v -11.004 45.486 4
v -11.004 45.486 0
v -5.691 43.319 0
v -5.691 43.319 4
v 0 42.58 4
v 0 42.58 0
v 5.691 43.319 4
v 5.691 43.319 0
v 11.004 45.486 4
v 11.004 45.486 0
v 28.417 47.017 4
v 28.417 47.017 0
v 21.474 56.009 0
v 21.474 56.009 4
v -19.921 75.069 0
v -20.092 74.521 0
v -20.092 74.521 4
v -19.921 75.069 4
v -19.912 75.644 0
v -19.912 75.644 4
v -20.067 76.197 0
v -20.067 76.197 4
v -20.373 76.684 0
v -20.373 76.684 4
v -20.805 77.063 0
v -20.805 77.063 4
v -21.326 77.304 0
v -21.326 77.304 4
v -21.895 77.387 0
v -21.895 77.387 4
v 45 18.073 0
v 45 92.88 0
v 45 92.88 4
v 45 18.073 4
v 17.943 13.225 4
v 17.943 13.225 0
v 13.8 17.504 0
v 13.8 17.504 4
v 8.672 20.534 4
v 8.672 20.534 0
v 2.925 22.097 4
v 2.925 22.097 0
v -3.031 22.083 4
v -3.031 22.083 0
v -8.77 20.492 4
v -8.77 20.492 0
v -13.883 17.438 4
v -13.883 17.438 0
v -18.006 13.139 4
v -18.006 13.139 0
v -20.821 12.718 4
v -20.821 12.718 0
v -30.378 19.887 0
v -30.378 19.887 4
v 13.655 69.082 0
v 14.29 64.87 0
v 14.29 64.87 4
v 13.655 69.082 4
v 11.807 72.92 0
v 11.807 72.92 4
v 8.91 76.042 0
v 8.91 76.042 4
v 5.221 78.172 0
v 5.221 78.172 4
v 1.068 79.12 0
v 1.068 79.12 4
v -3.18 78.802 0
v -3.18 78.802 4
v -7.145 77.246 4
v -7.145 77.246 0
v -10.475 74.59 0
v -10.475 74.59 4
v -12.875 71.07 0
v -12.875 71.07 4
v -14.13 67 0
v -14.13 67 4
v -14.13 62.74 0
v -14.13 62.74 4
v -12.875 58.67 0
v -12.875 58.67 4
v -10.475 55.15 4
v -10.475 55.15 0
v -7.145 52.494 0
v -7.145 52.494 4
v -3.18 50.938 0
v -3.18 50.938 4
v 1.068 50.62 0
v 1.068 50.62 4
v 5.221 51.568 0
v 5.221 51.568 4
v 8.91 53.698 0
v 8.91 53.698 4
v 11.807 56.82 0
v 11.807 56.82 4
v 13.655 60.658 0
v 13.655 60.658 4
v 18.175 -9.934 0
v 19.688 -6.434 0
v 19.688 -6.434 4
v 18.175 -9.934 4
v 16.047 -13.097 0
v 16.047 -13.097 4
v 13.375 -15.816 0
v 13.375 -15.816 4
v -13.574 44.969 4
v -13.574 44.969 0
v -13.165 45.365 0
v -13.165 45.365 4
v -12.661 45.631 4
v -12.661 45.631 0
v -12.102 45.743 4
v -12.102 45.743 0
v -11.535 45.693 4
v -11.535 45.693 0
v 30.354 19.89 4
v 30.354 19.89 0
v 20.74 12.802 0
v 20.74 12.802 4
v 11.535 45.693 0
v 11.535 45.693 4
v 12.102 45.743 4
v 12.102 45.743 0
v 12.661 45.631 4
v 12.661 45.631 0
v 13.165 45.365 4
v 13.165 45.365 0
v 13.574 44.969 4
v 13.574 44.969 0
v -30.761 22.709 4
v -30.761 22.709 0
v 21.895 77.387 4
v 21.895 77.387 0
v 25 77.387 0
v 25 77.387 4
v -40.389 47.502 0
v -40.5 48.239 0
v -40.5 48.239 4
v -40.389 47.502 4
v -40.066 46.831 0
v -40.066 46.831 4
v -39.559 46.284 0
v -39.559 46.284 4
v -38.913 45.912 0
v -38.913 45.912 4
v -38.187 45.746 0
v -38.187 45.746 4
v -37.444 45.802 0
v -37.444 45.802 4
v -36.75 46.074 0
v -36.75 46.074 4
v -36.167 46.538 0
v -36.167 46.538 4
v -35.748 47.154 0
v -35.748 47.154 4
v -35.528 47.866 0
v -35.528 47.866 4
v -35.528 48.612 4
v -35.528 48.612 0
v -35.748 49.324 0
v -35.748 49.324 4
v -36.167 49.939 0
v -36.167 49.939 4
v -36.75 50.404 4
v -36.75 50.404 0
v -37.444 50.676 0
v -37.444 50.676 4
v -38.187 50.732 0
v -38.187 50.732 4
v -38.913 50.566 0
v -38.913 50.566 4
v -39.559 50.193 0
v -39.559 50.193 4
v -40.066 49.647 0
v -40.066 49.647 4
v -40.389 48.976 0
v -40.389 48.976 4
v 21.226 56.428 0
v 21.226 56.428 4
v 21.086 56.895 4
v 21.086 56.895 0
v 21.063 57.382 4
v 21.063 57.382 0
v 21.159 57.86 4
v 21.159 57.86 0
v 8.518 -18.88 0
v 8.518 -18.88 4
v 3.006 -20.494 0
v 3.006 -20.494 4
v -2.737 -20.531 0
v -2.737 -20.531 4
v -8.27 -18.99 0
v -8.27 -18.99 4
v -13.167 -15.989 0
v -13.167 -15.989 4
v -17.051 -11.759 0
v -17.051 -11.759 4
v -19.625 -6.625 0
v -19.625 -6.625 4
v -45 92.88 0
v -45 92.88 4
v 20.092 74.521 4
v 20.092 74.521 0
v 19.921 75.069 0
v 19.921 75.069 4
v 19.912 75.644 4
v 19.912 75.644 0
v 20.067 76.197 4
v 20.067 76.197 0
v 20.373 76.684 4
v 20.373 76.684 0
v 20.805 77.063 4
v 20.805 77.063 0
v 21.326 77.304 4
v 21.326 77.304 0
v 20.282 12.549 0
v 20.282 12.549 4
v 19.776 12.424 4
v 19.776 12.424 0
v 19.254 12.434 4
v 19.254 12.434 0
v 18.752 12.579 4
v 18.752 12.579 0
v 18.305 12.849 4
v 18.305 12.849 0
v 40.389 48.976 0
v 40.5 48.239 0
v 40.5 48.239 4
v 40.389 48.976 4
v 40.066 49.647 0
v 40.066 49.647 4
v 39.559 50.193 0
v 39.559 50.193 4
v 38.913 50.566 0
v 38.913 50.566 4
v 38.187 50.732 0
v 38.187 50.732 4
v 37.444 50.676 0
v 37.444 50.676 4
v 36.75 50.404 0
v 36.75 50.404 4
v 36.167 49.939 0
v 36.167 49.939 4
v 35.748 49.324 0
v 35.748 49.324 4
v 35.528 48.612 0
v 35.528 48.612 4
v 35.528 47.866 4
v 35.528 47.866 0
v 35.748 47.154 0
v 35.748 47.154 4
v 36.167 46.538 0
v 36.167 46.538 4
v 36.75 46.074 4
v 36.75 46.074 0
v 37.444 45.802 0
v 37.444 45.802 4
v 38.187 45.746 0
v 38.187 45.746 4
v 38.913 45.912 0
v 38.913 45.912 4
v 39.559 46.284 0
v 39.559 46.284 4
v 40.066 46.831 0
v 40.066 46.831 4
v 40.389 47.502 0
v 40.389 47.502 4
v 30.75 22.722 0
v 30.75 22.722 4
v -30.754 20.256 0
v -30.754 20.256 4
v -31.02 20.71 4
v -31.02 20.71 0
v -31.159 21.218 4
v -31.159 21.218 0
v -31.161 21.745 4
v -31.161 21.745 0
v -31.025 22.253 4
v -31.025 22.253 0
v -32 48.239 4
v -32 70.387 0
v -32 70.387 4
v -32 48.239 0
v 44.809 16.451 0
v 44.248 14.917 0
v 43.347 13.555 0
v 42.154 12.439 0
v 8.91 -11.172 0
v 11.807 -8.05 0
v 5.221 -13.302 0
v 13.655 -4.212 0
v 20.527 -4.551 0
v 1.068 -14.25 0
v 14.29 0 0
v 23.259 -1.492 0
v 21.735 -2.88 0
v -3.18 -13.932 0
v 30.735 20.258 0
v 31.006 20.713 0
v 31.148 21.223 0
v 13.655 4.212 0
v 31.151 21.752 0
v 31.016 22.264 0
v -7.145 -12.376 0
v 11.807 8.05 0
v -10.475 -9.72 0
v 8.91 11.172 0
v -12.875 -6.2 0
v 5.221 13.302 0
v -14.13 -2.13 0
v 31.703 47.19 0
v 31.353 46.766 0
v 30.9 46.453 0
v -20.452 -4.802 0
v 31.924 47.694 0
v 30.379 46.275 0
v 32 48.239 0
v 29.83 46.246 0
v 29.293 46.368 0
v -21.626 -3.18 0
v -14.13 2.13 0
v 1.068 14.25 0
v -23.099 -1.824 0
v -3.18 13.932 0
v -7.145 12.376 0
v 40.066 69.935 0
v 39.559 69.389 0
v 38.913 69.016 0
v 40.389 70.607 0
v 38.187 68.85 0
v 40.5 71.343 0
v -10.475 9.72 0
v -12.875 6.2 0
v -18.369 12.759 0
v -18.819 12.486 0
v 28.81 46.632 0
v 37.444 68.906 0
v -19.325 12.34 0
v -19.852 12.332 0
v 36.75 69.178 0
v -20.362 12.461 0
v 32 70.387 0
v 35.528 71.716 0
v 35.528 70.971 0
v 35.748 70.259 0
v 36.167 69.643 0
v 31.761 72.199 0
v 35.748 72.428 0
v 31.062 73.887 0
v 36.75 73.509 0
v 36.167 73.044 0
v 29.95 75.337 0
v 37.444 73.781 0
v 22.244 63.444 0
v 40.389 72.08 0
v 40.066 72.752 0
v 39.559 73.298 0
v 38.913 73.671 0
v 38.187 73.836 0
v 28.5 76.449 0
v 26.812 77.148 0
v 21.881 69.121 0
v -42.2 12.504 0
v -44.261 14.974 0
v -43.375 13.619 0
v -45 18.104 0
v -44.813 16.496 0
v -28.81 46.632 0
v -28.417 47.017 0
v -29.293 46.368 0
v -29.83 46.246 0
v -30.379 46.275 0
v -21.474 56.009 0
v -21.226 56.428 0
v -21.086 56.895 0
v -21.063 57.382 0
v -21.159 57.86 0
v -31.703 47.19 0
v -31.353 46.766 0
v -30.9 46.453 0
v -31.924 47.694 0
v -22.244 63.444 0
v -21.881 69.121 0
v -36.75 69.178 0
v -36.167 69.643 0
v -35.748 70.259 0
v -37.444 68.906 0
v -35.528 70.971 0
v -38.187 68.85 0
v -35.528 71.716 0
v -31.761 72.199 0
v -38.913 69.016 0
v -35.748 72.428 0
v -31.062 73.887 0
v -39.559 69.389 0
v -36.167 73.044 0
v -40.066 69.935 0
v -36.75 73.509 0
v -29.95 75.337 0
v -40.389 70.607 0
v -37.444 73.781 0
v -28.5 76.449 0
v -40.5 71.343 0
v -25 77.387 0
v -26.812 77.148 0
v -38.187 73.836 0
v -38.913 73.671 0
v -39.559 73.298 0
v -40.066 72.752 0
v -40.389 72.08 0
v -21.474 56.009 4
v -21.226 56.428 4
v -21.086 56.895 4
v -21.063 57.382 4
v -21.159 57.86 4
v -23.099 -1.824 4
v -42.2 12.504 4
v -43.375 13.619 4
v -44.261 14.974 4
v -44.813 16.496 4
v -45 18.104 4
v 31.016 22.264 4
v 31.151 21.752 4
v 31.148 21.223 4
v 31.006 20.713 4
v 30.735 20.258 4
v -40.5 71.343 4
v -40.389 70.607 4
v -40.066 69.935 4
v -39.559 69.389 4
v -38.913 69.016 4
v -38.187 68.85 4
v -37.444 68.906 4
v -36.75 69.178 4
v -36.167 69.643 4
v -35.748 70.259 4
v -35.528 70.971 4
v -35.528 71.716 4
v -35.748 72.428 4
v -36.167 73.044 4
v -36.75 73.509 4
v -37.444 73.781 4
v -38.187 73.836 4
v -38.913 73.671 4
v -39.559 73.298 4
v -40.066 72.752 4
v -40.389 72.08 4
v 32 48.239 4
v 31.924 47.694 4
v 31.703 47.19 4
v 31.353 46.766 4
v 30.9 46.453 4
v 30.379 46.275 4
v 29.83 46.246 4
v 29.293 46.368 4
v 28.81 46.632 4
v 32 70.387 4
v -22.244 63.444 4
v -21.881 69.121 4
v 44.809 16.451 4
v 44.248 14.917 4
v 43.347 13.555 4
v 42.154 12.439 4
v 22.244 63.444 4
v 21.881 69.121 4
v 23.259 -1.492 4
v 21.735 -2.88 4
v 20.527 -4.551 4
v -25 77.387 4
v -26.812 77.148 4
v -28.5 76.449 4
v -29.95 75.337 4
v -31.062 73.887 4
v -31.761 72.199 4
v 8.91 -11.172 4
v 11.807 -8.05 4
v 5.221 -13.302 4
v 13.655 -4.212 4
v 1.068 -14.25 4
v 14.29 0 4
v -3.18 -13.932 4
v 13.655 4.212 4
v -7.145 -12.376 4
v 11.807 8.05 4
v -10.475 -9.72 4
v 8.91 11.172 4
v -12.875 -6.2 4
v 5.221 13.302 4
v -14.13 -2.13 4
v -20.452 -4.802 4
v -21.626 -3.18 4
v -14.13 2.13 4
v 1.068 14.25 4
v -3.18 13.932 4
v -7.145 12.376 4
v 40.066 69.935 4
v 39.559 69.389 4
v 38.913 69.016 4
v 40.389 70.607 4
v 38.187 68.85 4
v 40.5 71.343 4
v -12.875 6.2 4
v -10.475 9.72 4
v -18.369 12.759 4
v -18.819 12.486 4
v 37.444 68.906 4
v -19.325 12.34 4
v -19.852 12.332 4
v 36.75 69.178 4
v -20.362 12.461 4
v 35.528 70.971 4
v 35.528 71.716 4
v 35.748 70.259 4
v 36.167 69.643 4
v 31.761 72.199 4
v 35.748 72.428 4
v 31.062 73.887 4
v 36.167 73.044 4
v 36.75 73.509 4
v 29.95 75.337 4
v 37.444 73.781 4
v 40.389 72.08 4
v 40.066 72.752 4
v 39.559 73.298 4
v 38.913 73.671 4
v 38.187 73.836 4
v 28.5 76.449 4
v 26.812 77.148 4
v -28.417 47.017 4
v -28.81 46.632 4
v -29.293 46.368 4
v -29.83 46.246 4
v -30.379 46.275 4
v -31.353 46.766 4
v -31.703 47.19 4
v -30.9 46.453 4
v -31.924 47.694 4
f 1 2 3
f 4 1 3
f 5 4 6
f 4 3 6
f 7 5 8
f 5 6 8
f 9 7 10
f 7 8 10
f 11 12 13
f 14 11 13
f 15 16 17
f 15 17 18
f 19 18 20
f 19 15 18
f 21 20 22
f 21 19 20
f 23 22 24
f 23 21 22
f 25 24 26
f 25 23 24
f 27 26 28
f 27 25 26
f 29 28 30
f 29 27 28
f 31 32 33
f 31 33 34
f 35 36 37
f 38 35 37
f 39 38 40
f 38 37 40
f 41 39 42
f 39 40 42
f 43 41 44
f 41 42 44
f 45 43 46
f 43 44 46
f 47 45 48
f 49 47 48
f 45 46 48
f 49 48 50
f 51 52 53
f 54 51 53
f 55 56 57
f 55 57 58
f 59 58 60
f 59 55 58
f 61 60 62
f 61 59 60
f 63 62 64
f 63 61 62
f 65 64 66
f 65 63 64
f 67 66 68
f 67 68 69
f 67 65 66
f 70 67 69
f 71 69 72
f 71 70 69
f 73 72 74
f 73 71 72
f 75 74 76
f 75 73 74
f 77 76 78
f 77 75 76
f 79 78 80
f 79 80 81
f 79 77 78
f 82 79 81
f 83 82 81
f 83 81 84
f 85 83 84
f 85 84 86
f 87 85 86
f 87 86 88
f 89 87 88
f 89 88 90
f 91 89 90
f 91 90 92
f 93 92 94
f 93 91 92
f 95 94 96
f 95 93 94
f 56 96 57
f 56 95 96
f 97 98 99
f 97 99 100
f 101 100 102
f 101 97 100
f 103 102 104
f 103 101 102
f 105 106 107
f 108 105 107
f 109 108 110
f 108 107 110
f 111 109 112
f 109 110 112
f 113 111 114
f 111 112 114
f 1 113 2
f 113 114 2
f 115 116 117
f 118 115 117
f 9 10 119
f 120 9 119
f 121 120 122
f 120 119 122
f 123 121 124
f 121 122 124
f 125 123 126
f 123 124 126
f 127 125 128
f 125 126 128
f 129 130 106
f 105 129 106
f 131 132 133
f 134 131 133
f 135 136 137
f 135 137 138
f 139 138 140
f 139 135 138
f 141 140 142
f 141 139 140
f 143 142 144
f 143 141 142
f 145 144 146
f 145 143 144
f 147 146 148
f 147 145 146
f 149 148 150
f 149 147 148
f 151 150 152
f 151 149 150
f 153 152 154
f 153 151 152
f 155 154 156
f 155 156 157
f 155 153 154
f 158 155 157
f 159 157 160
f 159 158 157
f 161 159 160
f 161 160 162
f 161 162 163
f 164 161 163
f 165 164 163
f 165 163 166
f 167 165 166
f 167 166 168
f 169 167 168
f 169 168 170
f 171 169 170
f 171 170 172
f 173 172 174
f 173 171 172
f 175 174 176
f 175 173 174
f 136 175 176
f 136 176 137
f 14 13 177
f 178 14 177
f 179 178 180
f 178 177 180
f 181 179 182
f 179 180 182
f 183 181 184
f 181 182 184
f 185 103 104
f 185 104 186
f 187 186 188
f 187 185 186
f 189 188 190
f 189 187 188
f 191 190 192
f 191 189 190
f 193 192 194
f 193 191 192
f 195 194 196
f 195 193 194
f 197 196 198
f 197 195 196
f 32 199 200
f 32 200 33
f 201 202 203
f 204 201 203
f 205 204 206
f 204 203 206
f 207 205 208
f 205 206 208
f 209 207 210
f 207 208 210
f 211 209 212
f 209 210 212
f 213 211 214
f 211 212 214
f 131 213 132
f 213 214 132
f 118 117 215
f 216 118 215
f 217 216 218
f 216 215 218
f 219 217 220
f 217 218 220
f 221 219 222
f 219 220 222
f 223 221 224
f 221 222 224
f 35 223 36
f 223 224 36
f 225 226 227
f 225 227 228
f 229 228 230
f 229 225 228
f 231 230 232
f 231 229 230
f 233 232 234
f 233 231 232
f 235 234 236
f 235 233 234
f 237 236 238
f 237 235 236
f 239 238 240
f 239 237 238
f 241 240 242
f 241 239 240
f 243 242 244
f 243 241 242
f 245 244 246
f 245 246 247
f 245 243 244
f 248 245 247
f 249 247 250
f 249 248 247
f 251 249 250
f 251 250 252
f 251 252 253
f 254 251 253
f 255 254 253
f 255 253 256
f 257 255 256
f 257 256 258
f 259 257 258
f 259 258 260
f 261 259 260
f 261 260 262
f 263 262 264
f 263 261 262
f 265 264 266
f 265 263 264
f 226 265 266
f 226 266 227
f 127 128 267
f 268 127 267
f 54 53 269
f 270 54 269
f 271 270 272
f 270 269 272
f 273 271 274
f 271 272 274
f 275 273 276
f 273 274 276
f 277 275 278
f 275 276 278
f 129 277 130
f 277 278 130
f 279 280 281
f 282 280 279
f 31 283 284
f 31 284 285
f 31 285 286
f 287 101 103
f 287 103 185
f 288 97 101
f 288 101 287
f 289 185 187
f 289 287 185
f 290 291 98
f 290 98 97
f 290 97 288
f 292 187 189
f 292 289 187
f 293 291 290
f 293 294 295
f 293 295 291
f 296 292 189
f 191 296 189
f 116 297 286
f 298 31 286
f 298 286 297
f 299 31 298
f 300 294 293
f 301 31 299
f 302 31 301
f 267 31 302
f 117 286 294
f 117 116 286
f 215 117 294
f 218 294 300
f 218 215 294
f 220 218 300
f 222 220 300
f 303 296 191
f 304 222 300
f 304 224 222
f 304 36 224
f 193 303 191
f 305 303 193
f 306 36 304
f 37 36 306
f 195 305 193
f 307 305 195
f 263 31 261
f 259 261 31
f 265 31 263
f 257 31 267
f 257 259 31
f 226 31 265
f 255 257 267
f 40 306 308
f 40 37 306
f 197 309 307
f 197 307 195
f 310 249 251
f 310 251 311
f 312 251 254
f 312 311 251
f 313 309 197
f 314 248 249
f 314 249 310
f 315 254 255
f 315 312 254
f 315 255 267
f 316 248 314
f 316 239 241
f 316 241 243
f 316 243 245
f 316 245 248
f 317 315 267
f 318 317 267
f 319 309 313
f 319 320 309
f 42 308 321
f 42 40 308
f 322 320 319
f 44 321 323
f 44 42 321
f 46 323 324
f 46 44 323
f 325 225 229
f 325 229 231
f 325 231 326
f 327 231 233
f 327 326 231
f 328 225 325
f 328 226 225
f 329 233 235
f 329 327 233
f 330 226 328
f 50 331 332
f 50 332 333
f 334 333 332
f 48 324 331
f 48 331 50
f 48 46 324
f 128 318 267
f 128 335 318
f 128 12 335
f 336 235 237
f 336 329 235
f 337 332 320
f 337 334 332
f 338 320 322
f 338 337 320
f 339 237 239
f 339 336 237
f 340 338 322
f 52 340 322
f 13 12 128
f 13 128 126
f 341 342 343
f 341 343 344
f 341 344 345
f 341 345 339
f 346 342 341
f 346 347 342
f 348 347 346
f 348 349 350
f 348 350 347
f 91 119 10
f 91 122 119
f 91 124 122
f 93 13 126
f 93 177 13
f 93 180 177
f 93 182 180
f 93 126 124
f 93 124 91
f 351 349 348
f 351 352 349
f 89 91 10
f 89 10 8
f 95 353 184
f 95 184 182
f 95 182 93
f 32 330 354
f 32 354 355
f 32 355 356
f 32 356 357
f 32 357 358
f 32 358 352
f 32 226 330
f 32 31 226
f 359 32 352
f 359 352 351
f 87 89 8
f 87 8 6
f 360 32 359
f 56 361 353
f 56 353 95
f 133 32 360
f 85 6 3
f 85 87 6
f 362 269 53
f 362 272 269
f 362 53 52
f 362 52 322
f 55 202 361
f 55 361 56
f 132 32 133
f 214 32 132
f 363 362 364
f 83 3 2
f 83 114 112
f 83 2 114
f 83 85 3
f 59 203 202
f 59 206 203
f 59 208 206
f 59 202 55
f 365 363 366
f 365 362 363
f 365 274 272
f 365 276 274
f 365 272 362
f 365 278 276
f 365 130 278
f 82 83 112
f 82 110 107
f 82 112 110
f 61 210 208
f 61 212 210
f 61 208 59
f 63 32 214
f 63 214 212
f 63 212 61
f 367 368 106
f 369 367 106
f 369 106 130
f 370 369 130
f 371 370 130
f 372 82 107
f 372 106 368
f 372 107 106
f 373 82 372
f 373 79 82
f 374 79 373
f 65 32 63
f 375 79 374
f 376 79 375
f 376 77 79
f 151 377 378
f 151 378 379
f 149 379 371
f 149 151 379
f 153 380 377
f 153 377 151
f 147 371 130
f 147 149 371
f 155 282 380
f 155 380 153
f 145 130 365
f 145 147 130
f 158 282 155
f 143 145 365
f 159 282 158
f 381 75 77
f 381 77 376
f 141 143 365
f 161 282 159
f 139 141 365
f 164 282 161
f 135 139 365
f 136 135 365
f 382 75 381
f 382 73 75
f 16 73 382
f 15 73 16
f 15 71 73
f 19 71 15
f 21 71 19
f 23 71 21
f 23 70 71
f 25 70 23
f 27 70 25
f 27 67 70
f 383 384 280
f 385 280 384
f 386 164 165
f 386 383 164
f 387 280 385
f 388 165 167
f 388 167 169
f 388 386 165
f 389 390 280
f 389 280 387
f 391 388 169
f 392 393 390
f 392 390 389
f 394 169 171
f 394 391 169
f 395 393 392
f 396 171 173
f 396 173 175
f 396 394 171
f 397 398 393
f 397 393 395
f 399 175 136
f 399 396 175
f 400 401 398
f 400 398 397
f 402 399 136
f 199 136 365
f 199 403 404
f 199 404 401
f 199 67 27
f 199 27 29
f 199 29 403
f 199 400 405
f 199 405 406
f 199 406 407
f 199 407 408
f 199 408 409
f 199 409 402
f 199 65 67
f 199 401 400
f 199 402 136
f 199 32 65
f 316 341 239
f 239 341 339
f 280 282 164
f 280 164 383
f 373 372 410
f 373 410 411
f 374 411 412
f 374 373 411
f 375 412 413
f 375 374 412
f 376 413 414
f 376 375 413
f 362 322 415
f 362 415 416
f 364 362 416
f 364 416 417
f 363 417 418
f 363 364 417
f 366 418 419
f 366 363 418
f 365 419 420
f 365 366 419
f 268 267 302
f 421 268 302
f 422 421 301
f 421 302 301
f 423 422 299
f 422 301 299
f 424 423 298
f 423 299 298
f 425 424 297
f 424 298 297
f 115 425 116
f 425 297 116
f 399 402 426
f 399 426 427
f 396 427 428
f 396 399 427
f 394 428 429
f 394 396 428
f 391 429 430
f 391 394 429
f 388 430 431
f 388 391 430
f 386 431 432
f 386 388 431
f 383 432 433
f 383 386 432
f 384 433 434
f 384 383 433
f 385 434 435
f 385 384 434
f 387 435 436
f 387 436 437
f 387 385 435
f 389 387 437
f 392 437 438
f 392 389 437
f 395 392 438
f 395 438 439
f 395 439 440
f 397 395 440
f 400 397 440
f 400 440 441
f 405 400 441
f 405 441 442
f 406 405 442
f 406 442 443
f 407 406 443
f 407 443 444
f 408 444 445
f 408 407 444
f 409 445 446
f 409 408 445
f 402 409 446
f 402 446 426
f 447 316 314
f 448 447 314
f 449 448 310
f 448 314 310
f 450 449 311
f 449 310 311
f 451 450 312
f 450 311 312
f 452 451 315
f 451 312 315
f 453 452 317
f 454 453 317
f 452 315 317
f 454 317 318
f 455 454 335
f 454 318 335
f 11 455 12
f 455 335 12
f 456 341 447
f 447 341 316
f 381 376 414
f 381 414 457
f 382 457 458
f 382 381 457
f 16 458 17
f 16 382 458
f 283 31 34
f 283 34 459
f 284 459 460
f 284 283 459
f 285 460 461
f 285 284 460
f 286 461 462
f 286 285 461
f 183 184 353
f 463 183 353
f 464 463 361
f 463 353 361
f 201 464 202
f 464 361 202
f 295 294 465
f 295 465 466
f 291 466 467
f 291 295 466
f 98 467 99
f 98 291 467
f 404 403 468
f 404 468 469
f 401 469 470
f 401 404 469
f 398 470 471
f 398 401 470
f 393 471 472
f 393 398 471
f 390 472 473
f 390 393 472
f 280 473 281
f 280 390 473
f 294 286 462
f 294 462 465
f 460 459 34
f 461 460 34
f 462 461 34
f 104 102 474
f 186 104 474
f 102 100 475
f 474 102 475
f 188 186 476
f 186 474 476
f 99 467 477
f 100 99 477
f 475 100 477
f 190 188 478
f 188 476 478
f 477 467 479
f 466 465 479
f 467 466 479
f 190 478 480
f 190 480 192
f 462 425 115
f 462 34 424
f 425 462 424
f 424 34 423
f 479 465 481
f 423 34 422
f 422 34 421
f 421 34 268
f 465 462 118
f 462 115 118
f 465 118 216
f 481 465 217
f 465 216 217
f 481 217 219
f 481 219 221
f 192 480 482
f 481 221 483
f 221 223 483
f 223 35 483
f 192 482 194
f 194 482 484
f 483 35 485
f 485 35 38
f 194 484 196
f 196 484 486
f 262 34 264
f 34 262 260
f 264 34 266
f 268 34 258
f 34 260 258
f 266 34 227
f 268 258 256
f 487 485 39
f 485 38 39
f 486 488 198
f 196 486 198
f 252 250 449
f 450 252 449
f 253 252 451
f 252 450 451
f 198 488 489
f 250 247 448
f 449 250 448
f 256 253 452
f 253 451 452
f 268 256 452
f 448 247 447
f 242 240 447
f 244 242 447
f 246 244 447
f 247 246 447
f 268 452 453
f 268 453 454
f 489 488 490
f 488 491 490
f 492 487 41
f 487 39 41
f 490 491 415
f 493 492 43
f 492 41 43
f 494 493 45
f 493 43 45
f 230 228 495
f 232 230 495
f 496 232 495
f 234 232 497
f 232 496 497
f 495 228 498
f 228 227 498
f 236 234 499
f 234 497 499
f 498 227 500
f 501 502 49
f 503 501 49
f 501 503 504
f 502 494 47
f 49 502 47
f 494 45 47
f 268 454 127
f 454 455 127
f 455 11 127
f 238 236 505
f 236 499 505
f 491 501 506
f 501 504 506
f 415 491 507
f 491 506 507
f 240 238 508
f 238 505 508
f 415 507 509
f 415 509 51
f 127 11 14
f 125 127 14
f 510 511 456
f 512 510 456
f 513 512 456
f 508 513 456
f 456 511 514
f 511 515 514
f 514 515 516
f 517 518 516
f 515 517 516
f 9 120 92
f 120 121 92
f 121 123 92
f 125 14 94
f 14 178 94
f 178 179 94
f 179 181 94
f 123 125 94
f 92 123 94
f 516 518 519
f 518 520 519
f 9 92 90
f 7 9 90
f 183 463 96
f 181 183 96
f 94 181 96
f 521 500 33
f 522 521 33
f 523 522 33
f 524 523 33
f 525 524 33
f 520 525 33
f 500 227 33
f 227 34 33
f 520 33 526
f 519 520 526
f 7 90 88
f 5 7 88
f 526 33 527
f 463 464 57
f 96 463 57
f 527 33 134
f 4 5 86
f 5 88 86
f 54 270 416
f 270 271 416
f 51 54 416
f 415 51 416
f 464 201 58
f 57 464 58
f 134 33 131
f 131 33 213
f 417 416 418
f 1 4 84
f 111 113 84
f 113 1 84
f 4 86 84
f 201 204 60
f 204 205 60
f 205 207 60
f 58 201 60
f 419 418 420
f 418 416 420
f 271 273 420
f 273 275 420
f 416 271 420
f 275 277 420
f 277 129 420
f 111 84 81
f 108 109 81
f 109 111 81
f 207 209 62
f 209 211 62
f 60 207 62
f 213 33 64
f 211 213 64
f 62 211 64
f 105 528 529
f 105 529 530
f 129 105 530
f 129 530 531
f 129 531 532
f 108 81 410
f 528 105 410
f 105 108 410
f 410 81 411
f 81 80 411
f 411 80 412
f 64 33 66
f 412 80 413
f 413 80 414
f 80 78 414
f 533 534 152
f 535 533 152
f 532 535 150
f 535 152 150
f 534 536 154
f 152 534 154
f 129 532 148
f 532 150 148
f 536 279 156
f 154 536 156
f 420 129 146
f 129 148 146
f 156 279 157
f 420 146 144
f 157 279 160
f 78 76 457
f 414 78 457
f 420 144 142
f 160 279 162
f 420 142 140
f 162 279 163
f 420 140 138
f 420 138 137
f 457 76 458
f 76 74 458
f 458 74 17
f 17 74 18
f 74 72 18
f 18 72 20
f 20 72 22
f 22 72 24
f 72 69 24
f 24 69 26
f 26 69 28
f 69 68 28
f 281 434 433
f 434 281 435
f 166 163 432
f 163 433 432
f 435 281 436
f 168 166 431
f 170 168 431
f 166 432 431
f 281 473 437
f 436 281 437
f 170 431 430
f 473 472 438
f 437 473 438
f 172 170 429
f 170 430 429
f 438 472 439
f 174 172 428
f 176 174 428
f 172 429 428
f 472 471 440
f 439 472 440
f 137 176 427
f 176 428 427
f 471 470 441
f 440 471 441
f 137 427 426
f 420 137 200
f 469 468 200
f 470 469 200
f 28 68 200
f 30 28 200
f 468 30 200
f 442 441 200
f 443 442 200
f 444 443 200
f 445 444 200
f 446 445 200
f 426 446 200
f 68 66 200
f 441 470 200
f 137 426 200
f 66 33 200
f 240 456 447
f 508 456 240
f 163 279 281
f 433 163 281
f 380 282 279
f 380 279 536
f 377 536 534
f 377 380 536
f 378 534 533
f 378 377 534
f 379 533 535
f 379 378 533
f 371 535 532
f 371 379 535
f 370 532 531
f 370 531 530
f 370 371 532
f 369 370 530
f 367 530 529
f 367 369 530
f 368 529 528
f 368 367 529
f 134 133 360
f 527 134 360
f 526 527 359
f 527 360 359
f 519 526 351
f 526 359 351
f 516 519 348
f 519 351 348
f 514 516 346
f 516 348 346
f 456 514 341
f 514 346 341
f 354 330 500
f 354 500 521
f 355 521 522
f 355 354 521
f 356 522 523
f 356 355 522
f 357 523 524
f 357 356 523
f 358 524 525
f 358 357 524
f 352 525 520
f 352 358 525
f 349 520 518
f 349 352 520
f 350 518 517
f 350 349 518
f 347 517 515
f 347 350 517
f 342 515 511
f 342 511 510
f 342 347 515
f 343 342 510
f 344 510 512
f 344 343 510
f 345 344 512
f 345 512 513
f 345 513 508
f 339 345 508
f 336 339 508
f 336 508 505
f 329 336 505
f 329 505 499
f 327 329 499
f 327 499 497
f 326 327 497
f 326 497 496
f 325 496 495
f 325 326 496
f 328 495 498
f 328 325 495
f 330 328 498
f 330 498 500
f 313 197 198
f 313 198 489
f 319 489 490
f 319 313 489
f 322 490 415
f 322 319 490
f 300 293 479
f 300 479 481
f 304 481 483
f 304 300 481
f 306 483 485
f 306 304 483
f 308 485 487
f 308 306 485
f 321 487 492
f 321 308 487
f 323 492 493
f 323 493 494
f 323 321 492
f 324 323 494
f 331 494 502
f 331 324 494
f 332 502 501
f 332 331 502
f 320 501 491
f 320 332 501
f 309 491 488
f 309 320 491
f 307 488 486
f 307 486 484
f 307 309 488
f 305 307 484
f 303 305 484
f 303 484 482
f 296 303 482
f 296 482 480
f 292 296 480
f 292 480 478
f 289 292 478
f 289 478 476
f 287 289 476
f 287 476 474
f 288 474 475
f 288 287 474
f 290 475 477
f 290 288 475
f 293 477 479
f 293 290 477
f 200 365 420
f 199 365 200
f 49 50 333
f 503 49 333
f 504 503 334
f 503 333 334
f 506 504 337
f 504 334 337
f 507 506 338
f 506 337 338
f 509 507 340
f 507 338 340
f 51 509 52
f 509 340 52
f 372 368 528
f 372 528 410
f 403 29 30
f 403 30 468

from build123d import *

# Parameters (mm, degrees)
SKETCH1_R           = 14.29
SKETCH1_R_2         = 2.5
BOSS_EXTRUDE1_DEPTH = 4


with BuildPart() as part:
    # Sketch1 → Boss-Extrude1 (new body)
    with BuildSketch(Plane.XY):
        with BuildLine():
            Line((42.153928026, 12.438673777), (23.259125181, -1.491803793))
            ThreePointArc((23.259125181, -1.491803793), (21.087687699, -3.684227098), (19.688057389, -6.434299039))
            ThreePointArc((19.688057389, -6.434299039), (17.183961156, -11.564224439), (13.374639809, -15.815777498))
            ThreePointArc((13.374639809, -15.815777498), (-5.55728281, -19.953356), (-19.624705783, -6.625007986))
            ThreePointArc((-19.624705783, -6.625007986), (-20.997947453, -3.961204504), (-23.098831149, -1.823933026))
            Line((-23.098831149, -1.823933026), (-42.200396688, 12.504304927))
            ThreePointArc((-42.200396688, 12.504304927), (-44.261108051, 14.973735796), (-45.00000949, 18.104014507))
            Line((-45.00000949, 18.104014507), (-45.00000949, 85.67919791))
            Line((-45.00000949, 85.67919791), (-45.00000949, 92.880351926))
            Line((-45.00000949, 92.880351926), (44.99999051, 92.880351926))
            Line((44.99999051, 92.880351926), (44.99999051, 90.002365232))
            Line((44.99999051, 90.002365232), (44.99999051, 18.072926444))
            ThreePointArc((44.99999051, 18.072926444), (44.248092726, 14.916786603), (42.153928026, 12.438673777))
        make_face()
        Circle(SKETCH1_R, mode=Mode.SUBTRACT)
        with Locations((0, 64.87)):
            Circle(SKETCH1_R, mode=Mode.SUBTRACT)
        with Locations((37.99999051, 48.238911282)):
            Circle(SKETCH1_R_2, mode=Mode.SUBTRACT)
        with Locations((37.99999051, 71.343473564)):
            Circle(SKETCH1_R_2, mode=Mode.SUBTRACT)
        with Locations(Location((-37.99999051, 48.238911282, 0), (0, 0, 180))):
            Circle(SKETCH1_R_2, mode=Mode.SUBTRACT)
        with Locations(Location((-37.99999051, 71.343473564, 0), (0, 0, 180))):
            Circle(SKETCH1_R_2, mode=Mode.SUBTRACT)
        with BuildLine():
            Line((13.574400229, 44.968526689), (30.750314435, 22.722318802))
            ThreePointArc((30.750314435, 22.722318802), (31.147959551, 21.222946572), (30.35409022, 19.890276241))
            Line((30.35409022, 19.890276241), (20.739573812, 12.80182942))
            ThreePointArc((20.739573812, 12.80182942), (19.25353688, 12.434122338), (17.942793433, 13.224986345))
            ThreePointArc((17.942793433, 13.224986345), (-0.05305295, 22.289936864), (-18.005544161, 13.139424624))
            ThreePointArc((-18.005544161, 13.139424624), (-19.325388182, 12.340361548), (-20.821226271, 12.718460012))
            Line((-20.821226271, 12.718460012), (-30.377654795, 19.886813915))
            ThreePointArc((-30.377654795, 19.886813915), (-31.159381655, 21.217806836), (-30.760607673, 22.708987023))
            Line((-30.760607673, 22.708987023), (-13.574400229, 44.968526689))
            ThreePointArc((-13.574400229, 44.968526689), (-12.385736887, 45.706997131), (-11.003989114, 45.485564914))
            ThreePointArc((-11.003989114, 45.485564914), (0, 42.58), (11.003989114, 45.485564914))
            ThreePointArc((11.003989114, 45.485564914), (12.385736887, 45.706997131), (13.574400229, 44.968526689))
        make_face(mode=Mode.SUBTRACT)
        with BuildLine():
            Line((21.895204833, 77.38684864), (24.99999051, 77.38684864))
            ThreePointArc((24.99999051, 77.38684864), (29.949737978, 75.336596108), (31.99999051, 70.38684864))
            Line((31.99999051, 70.38684864), (31.99999051, 48.238911282))
            ThreePointArc((31.99999051, 48.238911282), (30.645696708, 46.346013105), (28.416927004, 47.016655197))
            Line((28.416927004, 47.016655197), (21.474414878, 56.008582273))
            ThreePointArc((21.474414878, 56.008582273), (21.085896999, 56.894881748), (21.158962255, 57.859834788))
            ThreePointArc((21.158962255, 57.859834788), (22.244467277, 66.293999852), (20.092388461, 74.520908036))
            ThreePointArc((20.092388461, 74.520908036), (20.202295915, 76.451770889), (21.895204833, 77.38684864))
        make_face(mode=Mode.SUBTRACT)
        with BuildLine():
            Line((-31.99999051, 70.38684864), (-31.99999051, 48.238911282))
            ThreePointArc((-31.99999051, 48.238911282), (-30.645696708, 46.346013105), (-28.416927004, 47.016655197))
            Line((-28.416927004, 47.016655197), (-21.474414878, 56.008582273))
            ThreePointArc((-21.474414878, 56.008582273), (-21.085896999, 56.894881748), (-21.158962255, 57.859834788))
            ThreePointArc((-21.158962255, 57.859834788), (-22.244467277, 66.293999852), (-20.092388461, 74.520908036))
            ThreePointArc((-20.092388461, 74.520908036), (-20.202295915, 76.451770889), (-21.895204833, 77.38684864))
            Line((-21.895204833, 77.38684864), (-24.99999051, 77.38684864))
            ThreePointArc((-24.99999051, 77.38684864), (-29.949737978, 75.336596108), (-31.99999051, 70.38684864))
        make_face(mode=Mode.SUBTRACT)
    extrude(amount=BOSS_EXTRUDE1_DEPTH)


solid = part.part
